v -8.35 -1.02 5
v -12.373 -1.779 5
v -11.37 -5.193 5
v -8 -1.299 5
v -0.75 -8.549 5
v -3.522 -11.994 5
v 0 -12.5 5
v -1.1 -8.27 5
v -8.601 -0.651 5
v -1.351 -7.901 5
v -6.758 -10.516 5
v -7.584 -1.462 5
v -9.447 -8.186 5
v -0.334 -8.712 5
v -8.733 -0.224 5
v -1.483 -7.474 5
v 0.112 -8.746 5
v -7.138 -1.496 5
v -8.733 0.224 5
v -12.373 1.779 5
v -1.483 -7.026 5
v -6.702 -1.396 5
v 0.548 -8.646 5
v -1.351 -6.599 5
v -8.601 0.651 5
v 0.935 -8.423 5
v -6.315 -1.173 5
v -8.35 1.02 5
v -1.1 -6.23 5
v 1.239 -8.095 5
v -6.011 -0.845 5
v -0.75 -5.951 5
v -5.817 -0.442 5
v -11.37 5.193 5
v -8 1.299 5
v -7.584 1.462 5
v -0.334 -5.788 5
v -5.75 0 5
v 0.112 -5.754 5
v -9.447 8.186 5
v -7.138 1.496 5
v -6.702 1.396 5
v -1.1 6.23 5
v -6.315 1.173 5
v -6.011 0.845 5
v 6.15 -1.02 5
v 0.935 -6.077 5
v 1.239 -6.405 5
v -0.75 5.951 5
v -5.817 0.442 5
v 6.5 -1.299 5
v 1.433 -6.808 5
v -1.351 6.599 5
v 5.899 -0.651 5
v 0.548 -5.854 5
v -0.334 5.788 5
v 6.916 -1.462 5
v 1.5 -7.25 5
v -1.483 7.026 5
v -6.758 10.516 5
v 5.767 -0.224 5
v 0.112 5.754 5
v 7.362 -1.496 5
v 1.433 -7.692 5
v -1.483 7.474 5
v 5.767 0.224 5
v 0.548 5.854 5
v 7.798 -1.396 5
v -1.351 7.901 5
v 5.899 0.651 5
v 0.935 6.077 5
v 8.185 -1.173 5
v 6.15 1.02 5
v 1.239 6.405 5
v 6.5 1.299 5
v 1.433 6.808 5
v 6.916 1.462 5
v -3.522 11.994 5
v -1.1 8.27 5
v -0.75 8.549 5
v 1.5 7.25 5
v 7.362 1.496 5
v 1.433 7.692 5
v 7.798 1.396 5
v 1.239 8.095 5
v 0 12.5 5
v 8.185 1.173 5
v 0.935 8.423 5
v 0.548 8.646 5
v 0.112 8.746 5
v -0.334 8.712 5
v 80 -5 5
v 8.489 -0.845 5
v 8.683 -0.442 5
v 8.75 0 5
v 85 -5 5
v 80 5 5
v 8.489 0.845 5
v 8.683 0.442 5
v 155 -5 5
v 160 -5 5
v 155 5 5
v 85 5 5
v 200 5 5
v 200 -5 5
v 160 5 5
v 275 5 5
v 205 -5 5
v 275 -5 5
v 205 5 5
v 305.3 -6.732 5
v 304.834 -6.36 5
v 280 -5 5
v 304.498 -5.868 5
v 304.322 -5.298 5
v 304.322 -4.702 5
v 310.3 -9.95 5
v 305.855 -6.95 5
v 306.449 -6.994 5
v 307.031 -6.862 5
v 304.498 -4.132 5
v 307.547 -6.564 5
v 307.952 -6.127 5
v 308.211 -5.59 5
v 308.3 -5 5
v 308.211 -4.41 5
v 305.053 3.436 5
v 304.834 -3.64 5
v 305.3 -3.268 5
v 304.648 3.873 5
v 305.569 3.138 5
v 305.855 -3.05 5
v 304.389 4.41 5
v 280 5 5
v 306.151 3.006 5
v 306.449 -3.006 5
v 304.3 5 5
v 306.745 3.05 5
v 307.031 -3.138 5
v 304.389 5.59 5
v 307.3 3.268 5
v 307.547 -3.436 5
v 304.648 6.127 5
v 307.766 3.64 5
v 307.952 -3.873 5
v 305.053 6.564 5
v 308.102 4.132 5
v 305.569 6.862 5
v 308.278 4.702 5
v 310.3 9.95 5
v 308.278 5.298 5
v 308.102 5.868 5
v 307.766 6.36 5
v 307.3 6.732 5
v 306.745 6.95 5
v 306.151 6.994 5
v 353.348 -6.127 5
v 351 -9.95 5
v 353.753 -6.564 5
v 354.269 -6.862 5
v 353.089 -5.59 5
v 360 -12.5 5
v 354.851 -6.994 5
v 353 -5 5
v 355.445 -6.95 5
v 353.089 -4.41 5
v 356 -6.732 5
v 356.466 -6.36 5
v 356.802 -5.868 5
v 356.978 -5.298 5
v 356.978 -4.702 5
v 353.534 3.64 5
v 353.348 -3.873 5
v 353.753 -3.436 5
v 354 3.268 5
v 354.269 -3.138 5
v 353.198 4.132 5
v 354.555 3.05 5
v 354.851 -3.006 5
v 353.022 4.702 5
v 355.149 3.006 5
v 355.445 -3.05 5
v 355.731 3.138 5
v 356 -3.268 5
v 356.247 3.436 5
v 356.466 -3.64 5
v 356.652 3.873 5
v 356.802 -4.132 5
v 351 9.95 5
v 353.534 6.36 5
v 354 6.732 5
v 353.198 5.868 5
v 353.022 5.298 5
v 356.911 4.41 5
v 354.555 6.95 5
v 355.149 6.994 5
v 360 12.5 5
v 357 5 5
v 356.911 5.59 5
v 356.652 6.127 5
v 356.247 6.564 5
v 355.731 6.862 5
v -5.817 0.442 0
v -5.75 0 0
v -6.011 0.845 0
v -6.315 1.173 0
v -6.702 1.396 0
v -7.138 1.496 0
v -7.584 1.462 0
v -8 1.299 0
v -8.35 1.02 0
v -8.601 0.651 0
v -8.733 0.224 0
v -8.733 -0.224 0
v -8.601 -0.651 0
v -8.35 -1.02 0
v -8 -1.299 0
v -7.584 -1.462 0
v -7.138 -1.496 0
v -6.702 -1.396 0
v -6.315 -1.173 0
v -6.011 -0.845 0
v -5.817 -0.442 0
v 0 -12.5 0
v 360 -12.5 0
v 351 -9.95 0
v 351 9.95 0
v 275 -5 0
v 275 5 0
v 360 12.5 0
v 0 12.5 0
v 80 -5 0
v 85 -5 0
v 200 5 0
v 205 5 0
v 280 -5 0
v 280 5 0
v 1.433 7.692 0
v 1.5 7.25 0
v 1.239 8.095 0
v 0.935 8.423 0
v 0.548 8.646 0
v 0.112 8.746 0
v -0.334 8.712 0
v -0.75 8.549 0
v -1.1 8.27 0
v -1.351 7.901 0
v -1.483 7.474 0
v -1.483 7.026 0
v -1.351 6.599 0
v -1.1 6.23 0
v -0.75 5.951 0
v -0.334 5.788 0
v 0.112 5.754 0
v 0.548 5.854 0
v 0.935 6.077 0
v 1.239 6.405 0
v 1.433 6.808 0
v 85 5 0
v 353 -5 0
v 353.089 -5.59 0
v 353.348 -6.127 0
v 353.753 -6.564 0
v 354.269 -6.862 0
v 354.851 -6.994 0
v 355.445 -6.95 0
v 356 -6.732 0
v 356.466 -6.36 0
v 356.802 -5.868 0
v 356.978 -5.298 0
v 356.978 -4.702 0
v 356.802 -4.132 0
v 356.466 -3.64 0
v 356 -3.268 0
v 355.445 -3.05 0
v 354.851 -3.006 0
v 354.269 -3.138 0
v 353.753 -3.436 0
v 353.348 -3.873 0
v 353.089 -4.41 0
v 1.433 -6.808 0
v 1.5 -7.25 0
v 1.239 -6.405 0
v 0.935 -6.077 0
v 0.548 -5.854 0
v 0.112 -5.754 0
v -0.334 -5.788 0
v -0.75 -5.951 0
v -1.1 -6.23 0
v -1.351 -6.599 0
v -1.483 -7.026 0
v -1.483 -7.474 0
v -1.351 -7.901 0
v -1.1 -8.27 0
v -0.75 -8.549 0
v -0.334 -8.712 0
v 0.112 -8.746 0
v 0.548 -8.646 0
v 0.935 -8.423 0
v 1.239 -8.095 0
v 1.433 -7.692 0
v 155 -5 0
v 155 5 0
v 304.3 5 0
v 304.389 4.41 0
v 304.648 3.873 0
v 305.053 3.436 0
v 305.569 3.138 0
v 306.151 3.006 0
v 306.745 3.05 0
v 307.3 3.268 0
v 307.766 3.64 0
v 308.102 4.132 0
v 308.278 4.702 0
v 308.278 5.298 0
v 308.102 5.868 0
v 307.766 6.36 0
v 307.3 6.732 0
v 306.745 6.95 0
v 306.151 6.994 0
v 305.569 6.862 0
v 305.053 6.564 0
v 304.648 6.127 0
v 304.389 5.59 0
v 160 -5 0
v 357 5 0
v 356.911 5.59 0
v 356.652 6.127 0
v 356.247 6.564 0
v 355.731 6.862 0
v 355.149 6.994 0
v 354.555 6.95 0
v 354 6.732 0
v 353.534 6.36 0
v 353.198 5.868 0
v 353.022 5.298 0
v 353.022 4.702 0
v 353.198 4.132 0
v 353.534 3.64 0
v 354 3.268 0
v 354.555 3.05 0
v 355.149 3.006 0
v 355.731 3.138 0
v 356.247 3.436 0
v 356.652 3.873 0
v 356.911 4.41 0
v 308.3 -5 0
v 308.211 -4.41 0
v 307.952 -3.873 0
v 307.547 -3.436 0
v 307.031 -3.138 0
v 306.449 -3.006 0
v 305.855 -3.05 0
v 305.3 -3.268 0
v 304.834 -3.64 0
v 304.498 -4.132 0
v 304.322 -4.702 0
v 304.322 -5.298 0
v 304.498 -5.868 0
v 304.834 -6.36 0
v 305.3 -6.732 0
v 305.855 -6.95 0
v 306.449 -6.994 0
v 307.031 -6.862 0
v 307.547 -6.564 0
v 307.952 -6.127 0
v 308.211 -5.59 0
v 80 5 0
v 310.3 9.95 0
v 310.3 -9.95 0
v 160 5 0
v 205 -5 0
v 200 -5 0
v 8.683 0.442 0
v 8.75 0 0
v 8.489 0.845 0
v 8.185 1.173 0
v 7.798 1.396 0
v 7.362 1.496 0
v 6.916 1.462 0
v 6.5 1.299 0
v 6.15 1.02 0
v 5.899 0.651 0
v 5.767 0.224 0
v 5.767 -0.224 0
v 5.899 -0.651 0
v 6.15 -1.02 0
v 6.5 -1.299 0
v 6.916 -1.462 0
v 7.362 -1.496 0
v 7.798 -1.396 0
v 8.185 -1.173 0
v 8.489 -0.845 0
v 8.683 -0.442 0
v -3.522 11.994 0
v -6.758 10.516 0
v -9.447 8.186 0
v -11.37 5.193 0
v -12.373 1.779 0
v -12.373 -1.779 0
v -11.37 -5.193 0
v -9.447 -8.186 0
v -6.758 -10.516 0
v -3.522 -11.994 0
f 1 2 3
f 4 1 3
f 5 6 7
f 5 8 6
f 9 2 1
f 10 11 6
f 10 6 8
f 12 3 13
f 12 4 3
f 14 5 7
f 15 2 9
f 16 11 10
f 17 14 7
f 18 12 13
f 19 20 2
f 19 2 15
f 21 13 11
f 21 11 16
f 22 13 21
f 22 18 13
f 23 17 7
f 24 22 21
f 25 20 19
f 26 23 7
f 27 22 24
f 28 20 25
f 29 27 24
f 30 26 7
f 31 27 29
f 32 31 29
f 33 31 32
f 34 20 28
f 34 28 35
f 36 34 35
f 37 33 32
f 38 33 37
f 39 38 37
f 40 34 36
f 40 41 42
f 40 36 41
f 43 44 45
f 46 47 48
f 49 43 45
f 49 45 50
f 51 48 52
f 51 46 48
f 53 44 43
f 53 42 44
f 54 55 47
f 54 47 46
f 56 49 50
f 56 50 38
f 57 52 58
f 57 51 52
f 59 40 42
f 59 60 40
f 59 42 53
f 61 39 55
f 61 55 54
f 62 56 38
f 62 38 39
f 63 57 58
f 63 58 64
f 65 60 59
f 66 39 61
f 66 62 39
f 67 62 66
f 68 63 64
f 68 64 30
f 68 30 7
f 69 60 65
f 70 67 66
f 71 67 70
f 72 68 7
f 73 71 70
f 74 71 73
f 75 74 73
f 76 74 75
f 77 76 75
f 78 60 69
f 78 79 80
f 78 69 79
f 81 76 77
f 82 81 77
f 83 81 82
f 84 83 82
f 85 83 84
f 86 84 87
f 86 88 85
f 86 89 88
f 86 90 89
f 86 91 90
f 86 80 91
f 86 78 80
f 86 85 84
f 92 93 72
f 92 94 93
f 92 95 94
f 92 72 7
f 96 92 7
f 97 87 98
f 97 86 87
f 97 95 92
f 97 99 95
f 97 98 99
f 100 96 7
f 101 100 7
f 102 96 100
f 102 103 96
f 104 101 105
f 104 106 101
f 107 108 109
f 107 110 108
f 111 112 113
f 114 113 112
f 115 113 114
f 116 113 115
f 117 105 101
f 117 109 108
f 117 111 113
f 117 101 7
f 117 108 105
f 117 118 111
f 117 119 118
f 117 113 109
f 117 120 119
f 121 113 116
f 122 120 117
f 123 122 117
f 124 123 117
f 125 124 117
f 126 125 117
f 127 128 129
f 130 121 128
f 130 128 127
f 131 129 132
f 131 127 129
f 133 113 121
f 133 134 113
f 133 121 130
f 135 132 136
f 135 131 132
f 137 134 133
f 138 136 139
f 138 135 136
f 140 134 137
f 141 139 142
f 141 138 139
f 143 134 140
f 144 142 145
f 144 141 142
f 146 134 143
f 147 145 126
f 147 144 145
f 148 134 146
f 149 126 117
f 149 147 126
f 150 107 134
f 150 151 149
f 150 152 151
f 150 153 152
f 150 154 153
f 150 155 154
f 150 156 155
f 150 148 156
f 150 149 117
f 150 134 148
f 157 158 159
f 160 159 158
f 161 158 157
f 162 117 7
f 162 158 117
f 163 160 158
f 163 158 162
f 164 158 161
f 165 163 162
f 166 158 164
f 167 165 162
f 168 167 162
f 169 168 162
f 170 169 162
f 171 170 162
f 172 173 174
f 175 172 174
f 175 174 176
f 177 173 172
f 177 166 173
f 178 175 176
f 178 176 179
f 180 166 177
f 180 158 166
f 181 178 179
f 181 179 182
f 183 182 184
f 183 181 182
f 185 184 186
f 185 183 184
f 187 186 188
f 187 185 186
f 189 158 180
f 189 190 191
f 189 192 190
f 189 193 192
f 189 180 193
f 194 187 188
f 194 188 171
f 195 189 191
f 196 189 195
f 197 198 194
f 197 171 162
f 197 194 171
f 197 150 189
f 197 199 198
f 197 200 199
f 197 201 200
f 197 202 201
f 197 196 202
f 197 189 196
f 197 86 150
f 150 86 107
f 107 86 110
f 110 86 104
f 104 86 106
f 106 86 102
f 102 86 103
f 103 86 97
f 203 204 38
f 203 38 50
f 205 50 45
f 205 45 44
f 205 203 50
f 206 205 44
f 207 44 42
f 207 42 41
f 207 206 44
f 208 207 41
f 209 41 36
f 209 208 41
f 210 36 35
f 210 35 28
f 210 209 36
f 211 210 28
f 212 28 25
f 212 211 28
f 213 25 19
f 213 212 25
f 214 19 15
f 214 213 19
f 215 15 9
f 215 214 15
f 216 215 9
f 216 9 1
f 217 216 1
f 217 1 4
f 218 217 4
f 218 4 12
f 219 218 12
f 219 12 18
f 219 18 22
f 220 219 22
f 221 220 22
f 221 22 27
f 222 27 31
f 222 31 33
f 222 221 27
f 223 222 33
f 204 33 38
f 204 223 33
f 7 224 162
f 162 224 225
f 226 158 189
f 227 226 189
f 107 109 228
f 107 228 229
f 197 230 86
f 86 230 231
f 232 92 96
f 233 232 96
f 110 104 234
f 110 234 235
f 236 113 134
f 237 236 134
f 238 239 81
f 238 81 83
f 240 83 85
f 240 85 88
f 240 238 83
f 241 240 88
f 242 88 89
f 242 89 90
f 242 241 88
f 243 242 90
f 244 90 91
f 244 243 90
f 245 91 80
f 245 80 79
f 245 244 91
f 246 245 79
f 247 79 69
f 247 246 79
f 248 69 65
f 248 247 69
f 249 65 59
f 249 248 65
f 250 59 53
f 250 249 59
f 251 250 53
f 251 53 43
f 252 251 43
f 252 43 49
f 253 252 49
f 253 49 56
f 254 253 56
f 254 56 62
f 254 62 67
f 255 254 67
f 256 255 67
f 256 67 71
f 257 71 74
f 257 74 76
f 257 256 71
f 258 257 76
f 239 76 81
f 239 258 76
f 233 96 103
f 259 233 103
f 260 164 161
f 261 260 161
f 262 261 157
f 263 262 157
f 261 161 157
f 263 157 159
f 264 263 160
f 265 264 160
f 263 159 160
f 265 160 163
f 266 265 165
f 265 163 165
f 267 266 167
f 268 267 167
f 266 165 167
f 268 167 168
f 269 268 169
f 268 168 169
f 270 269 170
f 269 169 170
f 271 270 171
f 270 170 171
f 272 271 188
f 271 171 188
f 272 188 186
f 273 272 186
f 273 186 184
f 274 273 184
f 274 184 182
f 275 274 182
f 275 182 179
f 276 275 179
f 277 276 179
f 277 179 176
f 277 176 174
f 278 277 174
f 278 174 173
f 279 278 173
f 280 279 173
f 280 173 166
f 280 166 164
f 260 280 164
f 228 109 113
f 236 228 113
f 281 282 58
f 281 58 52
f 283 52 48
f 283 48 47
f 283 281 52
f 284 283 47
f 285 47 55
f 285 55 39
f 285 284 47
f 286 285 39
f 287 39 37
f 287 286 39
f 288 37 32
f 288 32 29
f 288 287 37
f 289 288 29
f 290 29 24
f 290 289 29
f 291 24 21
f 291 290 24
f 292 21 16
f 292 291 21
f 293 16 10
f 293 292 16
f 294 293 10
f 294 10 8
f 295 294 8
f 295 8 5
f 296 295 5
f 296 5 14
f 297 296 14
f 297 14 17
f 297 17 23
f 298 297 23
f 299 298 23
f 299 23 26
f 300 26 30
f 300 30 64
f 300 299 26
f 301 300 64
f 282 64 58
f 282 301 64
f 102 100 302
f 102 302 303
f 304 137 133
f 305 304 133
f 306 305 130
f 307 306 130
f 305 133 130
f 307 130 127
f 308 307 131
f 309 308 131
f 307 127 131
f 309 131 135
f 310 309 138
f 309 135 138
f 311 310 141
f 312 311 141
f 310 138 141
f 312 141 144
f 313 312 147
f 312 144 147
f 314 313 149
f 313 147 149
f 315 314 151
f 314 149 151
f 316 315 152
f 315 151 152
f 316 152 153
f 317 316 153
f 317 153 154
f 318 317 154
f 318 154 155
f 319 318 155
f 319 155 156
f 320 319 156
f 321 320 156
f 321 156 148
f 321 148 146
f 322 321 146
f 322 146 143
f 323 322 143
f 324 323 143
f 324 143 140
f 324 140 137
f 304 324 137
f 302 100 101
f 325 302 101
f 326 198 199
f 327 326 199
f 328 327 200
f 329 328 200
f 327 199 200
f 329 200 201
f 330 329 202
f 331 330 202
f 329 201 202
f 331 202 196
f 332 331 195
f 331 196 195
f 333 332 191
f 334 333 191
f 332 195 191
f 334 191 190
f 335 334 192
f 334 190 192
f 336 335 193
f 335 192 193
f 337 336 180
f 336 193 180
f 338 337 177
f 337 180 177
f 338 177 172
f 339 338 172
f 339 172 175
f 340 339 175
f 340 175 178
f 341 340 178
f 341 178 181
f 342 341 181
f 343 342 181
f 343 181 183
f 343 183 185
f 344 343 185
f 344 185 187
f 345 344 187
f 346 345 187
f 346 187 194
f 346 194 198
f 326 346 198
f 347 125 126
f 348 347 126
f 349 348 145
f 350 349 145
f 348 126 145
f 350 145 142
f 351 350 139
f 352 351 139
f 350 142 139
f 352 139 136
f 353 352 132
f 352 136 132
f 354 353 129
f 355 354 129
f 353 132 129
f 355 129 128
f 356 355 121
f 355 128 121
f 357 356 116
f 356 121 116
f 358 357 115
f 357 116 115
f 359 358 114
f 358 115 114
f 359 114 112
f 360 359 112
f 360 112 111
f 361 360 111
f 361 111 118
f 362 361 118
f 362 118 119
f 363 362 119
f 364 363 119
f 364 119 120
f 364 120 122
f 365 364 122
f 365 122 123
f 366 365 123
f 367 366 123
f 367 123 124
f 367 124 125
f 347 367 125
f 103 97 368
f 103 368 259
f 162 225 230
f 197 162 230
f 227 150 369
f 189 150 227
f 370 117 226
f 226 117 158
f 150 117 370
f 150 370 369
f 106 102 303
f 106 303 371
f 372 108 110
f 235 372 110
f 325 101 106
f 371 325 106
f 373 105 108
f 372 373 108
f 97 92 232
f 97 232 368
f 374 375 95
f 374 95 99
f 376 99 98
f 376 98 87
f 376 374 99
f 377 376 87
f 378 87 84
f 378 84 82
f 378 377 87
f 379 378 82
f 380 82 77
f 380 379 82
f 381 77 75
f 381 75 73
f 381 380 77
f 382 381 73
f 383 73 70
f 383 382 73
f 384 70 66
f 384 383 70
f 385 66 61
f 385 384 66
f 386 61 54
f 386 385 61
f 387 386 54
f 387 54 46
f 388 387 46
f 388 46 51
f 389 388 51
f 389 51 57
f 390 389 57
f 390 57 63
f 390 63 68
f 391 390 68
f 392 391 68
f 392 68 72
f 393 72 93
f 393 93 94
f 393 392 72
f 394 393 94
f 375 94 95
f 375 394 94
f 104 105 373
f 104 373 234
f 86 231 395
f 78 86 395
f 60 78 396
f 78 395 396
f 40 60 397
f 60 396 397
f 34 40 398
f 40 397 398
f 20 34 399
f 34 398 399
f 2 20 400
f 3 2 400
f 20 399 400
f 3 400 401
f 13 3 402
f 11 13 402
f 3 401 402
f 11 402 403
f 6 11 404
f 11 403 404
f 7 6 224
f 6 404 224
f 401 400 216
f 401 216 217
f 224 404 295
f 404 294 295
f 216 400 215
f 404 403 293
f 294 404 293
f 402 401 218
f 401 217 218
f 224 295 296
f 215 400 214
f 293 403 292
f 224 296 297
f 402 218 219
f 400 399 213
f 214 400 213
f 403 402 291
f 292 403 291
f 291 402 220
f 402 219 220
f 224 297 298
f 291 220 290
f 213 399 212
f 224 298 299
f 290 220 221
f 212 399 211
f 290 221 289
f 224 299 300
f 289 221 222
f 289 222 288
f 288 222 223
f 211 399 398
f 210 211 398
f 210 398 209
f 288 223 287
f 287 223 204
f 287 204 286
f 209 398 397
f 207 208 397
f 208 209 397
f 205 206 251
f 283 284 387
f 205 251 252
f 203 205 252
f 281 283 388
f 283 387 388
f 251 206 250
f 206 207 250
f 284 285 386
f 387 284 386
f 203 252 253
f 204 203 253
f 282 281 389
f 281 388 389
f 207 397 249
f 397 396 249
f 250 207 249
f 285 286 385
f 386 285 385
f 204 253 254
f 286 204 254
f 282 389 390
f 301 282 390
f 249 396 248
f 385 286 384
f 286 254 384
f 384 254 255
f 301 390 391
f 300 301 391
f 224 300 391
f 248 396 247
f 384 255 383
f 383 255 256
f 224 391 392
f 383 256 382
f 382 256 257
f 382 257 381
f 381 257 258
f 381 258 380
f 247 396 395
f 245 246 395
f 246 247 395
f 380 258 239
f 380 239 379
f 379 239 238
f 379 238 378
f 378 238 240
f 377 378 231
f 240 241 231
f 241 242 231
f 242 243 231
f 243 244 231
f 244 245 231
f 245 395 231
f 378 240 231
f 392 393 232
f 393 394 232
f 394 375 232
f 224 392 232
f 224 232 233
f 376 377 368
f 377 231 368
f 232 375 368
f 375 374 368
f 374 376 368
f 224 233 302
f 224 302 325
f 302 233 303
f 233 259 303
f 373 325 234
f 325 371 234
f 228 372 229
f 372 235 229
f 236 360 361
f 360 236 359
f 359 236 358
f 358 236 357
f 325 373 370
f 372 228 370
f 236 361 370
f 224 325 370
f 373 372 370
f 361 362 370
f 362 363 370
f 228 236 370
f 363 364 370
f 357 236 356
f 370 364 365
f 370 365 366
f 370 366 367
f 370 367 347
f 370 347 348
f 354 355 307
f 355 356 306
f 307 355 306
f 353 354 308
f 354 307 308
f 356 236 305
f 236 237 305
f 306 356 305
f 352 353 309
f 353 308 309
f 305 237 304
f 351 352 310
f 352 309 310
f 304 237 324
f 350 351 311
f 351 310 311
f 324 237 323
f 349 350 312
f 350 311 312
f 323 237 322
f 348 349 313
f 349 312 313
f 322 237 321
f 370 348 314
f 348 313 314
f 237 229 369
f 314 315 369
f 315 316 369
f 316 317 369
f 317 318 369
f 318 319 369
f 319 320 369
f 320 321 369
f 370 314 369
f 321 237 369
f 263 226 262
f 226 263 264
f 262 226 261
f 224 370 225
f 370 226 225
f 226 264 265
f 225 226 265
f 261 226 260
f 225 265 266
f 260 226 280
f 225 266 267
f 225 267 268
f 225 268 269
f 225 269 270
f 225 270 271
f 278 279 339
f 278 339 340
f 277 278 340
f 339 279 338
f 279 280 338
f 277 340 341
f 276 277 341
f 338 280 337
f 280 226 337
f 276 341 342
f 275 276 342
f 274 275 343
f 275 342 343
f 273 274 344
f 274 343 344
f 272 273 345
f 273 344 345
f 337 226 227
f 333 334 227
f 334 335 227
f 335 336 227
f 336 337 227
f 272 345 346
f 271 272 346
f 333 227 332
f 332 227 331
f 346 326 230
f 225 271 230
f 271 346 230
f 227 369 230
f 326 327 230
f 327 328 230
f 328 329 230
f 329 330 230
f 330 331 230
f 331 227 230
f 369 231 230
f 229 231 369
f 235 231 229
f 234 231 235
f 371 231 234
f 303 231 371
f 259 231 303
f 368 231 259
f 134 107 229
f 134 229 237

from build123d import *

# Parameters (mm, degrees)
SKETCH_1_R          = 1.5
EXTRUDE_1_DEPTH     = 5
SKETCH_4_W          = 40.7
SKETCH_4_H          = 19.9
CUT_EXTRUDE_1_DEPTH = 361.251648157
SKETCH_6_W          = 5
SKETCH_6_H          = 10
CUT_EXTRUDE_2_DEPTH = 361.251648157
SKETCH_7_R          = 2
CUT_EXTRUDE_3_DEPTH = 361.251648157


with BuildPart() as part:
    # 스케치1 → 보스-돌출1 (new body)
    with BuildSketch(Plane.XY):
        with BuildLine():
            Line((0, -12.5), (360, -12.5))
            Line((360, -12.5), (360, 12.5))
            Line((360, 12.5), (0, 12.5))
            ThreePointArc((0, 12.5), (-12.5, 0), (0, -12.5))
        make_face()
        with Locations((0, 7.25)):
            Circle(SKETCH_1_R, mode=Mode.SUBTRACT)
        with Locations((7.25, 0)):
            Circle(SKETCH_1_R, mode=Mode.SUBTRACT)
        with Locations((0, -7.25)):
            Circle(SKETCH_1_R, mode=Mode.SUBTRACT)
        with Locations((-7.25, 0)):
            Circle(SKETCH_1_R, mode=Mode.SUBTRACT)
    extrude(amount=EXTRUDE_1_DEPTH)

    # 스케치4 → 컷-돌출1 (cut, through all)
    with BuildSketch(Plane.XY.offset(5)):
        with Locations((330.65, 0)):
            Rectangle(SKETCH_4_W, SKETCH_4_H)
    extrude(amount=-CUT_EXTRUDE_1_DEPTH, mode=Mode.SUBTRACT)

    # 스케치6 → 컷-돌출2 (cut, through all)
    with BuildSketch(Plane.XY.offset(5)):
        with Locations((82.5, 0)):
            Rectangle(SKETCH_6_W, SKETCH_6_H)
        with Locations((202.5, 0)):
            Rectangle(SKETCH_6_W, SKETCH_6_H)
        with Locations((157.5, 0)):
            Rectangle(SKETCH_6_W, SKETCH_6_H)
        with Locations((277.5, 0)):
            Rectangle(SKETCH_6_W, SKETCH_6_H)
    extrude(amount=-CUT_EXTRUDE_2_DEPTH, mode=Mode.SUBTRACT)

    # 스케치7 → 컷-돌출3 (cut, through all)
    with BuildSketch(Plane.XY.offset(5)):
        with Locations((355, 5)):
            Circle(SKETCH_7_R)
        with Locations(Location((355, -5, 0), (0, 0, 180))):
            Circle(SKETCH_7_R)
        with Locations(Location((306.3, 5, 0), (0, 0, 180))):
            Circle(SKETCH_7_R)
        with Locations((306.3, -5)):
            Circle(SKETCH_7_R)
    extrude(amount=-CUT_EXTRUDE_3_DEPTH, mode=Mode.SUBTRACT)


solid = part.part
